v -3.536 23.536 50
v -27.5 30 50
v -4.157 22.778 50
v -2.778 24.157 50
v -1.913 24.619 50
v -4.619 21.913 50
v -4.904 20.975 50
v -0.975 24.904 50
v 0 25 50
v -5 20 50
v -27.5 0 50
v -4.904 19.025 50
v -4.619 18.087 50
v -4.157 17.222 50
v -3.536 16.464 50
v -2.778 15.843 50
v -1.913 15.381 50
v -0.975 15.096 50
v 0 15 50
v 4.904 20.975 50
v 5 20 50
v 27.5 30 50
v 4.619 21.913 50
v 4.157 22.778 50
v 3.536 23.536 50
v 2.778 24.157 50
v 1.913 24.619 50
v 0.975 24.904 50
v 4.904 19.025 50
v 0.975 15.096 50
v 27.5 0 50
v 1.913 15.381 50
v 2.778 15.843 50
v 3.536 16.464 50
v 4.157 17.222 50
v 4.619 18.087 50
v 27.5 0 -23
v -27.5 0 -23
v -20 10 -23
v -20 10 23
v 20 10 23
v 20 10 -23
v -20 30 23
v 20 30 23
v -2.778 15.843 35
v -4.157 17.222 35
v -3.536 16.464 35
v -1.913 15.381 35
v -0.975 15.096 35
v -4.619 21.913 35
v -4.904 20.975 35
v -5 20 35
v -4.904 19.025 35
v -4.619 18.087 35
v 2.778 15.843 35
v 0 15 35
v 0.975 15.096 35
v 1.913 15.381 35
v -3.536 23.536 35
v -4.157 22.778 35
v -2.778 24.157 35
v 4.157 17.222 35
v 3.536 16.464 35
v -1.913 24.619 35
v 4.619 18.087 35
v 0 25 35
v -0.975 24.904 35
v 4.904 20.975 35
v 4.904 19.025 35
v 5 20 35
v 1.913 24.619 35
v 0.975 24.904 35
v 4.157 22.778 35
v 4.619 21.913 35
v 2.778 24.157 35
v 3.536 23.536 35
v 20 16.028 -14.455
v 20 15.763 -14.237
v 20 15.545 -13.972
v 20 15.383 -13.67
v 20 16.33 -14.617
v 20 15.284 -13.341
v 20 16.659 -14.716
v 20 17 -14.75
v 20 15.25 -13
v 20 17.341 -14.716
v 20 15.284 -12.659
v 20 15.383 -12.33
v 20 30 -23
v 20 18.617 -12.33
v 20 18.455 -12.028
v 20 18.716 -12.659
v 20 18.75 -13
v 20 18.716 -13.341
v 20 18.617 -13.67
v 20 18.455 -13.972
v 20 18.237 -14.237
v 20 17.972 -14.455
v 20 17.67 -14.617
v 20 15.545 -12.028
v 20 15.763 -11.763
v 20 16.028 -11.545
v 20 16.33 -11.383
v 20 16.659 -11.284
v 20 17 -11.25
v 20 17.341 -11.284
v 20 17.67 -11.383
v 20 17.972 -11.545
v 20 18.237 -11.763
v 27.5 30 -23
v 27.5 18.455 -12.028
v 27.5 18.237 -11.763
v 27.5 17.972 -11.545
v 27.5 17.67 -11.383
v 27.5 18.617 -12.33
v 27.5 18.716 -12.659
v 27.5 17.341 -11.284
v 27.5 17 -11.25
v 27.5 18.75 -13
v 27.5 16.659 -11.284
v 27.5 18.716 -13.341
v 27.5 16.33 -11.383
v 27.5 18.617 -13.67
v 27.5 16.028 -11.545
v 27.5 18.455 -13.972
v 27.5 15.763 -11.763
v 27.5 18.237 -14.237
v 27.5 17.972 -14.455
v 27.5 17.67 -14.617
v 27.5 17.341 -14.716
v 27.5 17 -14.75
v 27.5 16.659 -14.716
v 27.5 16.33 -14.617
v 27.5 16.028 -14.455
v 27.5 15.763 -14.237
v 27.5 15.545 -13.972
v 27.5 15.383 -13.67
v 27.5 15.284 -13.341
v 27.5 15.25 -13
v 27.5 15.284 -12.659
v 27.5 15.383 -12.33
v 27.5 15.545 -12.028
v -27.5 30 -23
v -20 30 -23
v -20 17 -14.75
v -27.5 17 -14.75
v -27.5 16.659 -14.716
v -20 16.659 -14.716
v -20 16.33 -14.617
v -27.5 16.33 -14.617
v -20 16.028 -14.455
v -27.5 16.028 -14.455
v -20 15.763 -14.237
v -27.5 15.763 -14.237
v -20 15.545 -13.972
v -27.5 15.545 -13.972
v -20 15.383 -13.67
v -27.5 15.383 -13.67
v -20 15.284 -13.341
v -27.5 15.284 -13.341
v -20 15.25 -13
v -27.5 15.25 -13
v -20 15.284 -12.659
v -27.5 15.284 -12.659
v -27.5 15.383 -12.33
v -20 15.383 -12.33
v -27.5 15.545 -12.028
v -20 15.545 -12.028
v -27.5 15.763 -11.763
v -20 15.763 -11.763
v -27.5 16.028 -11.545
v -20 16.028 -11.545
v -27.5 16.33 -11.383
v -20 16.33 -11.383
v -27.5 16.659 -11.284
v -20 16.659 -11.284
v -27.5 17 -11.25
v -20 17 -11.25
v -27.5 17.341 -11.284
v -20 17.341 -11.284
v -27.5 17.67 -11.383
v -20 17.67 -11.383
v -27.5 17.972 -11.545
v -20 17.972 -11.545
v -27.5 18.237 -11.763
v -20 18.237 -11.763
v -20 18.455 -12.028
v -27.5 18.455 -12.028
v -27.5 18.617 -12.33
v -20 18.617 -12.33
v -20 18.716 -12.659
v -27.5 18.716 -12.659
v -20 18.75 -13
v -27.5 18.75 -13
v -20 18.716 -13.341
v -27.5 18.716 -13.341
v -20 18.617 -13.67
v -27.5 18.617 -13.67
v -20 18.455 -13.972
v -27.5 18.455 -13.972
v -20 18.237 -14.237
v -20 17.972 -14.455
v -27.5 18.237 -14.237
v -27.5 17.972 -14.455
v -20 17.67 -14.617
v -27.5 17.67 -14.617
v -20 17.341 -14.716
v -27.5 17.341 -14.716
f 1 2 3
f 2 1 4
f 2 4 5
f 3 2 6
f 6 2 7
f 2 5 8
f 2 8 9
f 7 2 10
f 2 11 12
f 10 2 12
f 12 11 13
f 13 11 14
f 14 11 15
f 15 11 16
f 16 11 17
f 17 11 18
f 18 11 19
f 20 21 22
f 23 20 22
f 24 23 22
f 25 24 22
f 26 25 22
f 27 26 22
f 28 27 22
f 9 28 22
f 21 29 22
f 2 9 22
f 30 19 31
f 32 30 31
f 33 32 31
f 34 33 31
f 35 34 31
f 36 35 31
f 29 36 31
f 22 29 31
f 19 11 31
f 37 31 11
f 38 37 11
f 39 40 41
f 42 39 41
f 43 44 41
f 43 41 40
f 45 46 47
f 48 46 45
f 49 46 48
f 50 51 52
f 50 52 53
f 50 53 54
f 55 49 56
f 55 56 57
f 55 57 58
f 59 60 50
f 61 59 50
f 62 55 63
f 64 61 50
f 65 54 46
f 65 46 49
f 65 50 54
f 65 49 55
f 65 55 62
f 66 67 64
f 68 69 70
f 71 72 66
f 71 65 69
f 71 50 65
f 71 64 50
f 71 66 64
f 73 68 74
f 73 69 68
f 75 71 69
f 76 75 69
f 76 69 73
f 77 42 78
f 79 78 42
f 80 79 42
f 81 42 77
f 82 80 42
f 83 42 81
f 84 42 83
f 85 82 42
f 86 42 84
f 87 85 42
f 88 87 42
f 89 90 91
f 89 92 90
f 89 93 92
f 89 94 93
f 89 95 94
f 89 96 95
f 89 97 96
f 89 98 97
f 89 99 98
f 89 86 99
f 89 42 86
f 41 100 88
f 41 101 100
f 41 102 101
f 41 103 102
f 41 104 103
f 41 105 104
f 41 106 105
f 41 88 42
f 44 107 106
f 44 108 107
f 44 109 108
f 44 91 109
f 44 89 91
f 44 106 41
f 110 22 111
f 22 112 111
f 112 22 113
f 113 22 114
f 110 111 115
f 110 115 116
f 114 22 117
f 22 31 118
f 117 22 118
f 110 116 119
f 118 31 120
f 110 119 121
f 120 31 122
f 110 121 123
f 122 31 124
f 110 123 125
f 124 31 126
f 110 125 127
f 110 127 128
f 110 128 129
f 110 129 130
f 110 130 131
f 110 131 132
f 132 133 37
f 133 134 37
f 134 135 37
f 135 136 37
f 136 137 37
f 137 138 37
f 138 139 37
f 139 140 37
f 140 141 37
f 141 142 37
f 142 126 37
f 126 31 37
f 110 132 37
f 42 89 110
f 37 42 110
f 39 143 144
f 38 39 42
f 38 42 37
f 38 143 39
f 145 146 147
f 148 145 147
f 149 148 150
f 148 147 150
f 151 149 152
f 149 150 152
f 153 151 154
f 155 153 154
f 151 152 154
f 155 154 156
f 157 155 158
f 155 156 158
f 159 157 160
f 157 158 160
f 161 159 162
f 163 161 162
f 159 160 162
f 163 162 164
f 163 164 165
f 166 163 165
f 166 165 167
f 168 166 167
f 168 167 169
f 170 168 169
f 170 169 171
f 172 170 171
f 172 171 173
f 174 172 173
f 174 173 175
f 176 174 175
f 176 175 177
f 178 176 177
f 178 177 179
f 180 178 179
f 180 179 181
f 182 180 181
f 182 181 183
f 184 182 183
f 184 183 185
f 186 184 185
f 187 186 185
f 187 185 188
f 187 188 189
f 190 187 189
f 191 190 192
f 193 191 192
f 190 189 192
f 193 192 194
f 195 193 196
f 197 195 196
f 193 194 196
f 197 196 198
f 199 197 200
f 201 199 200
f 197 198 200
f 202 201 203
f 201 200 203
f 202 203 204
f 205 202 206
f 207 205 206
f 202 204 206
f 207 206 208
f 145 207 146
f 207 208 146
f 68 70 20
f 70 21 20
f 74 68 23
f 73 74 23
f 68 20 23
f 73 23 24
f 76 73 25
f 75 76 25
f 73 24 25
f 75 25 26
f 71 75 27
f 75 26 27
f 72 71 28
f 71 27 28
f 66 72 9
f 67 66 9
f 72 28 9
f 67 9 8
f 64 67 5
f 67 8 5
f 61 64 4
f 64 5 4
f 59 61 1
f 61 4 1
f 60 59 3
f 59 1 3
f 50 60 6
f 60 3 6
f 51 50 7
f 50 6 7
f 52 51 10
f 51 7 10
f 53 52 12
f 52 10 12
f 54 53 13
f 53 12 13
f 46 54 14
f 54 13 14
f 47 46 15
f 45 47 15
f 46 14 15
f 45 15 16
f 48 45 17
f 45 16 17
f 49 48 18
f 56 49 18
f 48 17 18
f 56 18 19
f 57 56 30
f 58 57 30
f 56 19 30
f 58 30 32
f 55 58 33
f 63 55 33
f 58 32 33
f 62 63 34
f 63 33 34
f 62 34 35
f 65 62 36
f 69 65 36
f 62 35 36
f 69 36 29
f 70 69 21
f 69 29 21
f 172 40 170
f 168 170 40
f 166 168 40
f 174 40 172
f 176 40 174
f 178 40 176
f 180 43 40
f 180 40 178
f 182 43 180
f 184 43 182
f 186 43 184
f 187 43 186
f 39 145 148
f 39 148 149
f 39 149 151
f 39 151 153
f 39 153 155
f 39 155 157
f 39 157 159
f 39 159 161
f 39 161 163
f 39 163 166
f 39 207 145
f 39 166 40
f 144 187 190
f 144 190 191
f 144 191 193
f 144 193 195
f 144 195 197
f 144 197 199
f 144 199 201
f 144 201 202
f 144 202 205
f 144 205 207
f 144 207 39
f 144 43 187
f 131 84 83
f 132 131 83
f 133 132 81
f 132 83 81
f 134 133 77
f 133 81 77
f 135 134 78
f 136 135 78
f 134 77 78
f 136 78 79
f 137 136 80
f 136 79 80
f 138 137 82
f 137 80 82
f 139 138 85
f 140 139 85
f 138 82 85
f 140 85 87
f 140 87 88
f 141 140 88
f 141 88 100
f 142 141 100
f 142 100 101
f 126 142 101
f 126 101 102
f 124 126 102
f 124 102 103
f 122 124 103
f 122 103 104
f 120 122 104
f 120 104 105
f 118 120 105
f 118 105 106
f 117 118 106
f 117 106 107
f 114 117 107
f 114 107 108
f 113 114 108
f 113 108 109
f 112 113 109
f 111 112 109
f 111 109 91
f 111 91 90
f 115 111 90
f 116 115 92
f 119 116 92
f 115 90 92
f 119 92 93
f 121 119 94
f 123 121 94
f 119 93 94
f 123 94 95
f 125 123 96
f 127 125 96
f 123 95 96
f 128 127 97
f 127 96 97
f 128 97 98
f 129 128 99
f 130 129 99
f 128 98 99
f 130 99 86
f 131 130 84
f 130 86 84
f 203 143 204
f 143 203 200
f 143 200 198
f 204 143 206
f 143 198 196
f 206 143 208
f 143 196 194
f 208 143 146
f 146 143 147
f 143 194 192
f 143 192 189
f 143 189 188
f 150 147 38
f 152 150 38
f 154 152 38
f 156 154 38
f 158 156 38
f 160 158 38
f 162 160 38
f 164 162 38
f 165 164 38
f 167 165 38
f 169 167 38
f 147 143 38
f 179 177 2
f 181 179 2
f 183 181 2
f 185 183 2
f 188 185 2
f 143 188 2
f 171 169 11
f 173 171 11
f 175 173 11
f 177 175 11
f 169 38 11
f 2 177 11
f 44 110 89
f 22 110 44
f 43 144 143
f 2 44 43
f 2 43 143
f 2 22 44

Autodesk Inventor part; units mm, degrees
ref_plane "YZ Plane" through (0, 0, 0) normal (1, 0, 0) x (0, 1, 0)
sketch "Boceto1" plane through (0, 0, 0) normal (0, 1, 0) x (-1, 0, 0)
  line L0 (27.5, 50) -> (-27.5, 50)
  line L1 (-27.5, 50) -> (-27.5, -50)
  line L2 (-27.5, -50) -> (27.5, -50)
  line L3 (27.5, -50) -> (27.5, 50)
  line L4 (27.5, 50) -> (-27.5, -50) construction
  line L5 (-27.5, 50) -> (27.5, -50) construction
  point P0 (0, 0)
  dimension "d0" = 55
  dimension "d1" = 100
extrude "Extrusión1" add sketch "Boceto1" along normal blind 30
sketch "Boceto2" plane through (27.5, 0, -50) normal (0, 0, -1) x (-1, 0, 0)
  line L0 (22.5, 25) -> (32.5, 25)
  line L1 (32.5, 25) -> (32.5, 5)
  line L2 (32.5, 5) -> (22.5, 5)
  line L3 (22.5, 5) -> (22.5, 25)
  line L4 (22.5, 25) -> (32.5, 5) construction
  line L5 (32.5, 25) -> (22.5, 5) construction
  line L6 (0, 30) -> (55, 30) projected
  line L7 (0, 0) -> (0, 30) projected
  line L8 (55, 0) -> (55, 30) projected
  point P0 (27.5, 0)
  point P1 (27.5, 15)
  point P2 (27.5, 25)
  dimension "d4" = 10
  dimension "d5" = 20
  dimension "d6" = 5
  dimension "d7" = 22.5
  dimension "d24" = 22.5
extrude "Extrusión2" add sketch "Boceto2" along normal blind 10
sketch "Boceto3" plane through (-27.5, 0, 50) normal (0, 0, 1) x (1, 0, 0)
  circle A0 centre (27.5, 20) radius 5
  line L0 (0, 30) -> (55, 30) projected
  point P0 (27.5, 0)
  point P1 (27.5, 30)
  dimension "d10" = 10
  dimension "d11" = 10
extrude "Extrusión3" cut sketch "Boceto3" against normal blind 15
sketch "Boceto4" plane through (0, 30, 0) normal (0, 1, 0) x (1, 0, 0)
  line L0 (-20, 23) -> (20, 23)
  line L1 (20, 23) -> (20, -23)
  line L2 (20, -23) -> (-20, -23)
  line L3 (-20, -23) -> (-20, 23)
  line L4 (-20, 23) -> (20, -23) construction
  line L5 (20, 23) -> (-20, -23) construction
  point P0 (0, 0)
  dimension "d14" = 40
  dimension "d15" = 46
extrude "Extrusión4" cut sketch "Boceto4" against normal blind 20
ref_plane "Plano de trabajo1" through (0, 5, -50) normal (1, 0, 0) x (0, 0, -1)
sketch "Boceto5" plane through (0, 5, -50) normal (1, 0, 0) x (0, 0, -1)
  line L0 (7.5, 0) -> (0, -2.5)
  line L1 (0, -2.5) -> (0, 0)
  line L2 (0, 0) -> (7.5, 0)
  point P0 (-50, -5)
  point P1 (0, -5)
  point P2 (10, 0)
  dimension "d25" = 2.5
  dimension "d26" = 2.5
extrude "Extrusión5" add sketch "Boceto5" along normal mid plane 8
ref_plane "Plano de trabajo2" through (0, 15, 0) normal (0, -1, 0) x (1, 0, 0)
sketch "Boceto6" plane through (0, 15, 0) normal (0, -1, 0) x (1, 0, 0)
  line L0 (5, -50) -> (8, -50)
  line L1 (27.5, -50) -> (-27.5, -50)
  line L2 (5, -57) -> (8, -50)
  line L3 (4, -50) -> (5, -50) projected
  line L4 (5, -50) -> (5, -57)
  line L5 (0, -50.2371) -> (0, -56.5746)
  line L6 (-5, -50) -> (-8, -50)
  line L7 (-27.5, -50) -> (27.5, -50)
  line L8 (-5, -57) -> (-8, -50)
  line L9 (-4, -50) -> (-5, -50)
  line L10 (-5, -50) -> (-5, -57)
  point P0 (0, 0)
  point P1 (5, -60)
  point P2 (-5, -60)
  dimension "d29" = 3
  dimension "d30" = 3
extrude "Extrusión6" add sketch "Boceto6" along normal mid plane 8
sketch "Boceto7" plane through (27.5, 0, 50) normal (1, 0, 0) x (0, 0, -1)
  point P0 (50, 0)
ref_plane "Plano de trabajo4" through (-20, 30, -23) normal (0, 0, 1) x (1, 0, 0)
sketch "Boceto8" plane through (27.5, 0, 50) normal (1, 0, 0) x (0, 0, -1)
  line L0 (58, 22) -> (88, 22)
  circle A0 centre (83, 17) radius 1.75
  line L1 (63, 17) -> (83, 17)
  line L2 (88, 22) -> (88, 12)
  circle A1 centre (63, 17) radius 1.75
  line L3 (58, 12) -> (88, 22) construction
  line L4 (58, 22) -> (88, 12) construction
  line L5 (58, 12) -> (58, 22)
  line L6 (88, 12) -> (58, 12)
  line L7 (73, 30) -> (73, 10) projected
  line L8 (0, 30) -> (100, 30) projected
  point P0 (50, 0)
  point P1 (72.9522, 12.5553)
  point P2 (57.9522, 14.5161)
  point P3 (72.9522, 12.5553)
  point P4 (88, 17)
  dimension "d34" = 10
  dimension "d35" = 30
  dimension "d36" = 5
  dimension "d37" = 5
  dimension "d38" = 5
  dimension "d39" = 5
  dimension "d40" = 10
  dimension "d41" = 8
hole "Agujero1" at (27.5, 17, -13) at (27.5, 17, -33) direction (-1, 0, 0) diameter 3.5 end through all
split "Dividir1" plane through (-20, 30, -23) removes the side toward (0, 0, -1)
properties part number "camera_support_2_2"
